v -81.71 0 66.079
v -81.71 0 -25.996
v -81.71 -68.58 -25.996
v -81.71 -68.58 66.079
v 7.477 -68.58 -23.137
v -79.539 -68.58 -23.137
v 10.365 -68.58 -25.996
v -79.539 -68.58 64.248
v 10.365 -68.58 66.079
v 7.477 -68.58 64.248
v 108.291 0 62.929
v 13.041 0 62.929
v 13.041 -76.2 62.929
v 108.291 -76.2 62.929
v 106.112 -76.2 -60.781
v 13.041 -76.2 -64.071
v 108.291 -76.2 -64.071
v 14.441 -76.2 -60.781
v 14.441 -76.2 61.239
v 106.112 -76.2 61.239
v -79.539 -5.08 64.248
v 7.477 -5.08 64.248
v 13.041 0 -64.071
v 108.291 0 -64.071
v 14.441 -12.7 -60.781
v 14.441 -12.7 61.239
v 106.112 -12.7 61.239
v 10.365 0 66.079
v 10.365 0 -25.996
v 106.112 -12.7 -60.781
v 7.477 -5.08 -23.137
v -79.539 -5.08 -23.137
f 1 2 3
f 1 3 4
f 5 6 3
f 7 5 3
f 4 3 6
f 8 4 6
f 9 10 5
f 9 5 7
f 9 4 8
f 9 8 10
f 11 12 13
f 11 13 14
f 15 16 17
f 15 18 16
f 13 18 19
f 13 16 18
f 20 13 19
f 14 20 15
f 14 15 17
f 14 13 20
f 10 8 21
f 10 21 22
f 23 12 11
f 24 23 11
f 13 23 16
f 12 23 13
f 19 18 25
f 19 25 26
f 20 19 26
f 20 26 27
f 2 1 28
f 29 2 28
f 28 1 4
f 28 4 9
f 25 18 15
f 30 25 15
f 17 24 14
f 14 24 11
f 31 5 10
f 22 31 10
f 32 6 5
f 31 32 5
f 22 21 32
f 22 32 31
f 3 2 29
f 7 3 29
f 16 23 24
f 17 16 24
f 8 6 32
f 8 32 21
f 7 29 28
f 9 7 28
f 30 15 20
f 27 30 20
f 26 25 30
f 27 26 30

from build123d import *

# Parameters (mm, degrees)
F0_W     = 92.075
F0_H     = 92.075
F1_DEPTH = 68.58
F2_W     = 87.015483
F2_H     = 87.384192
F3_DEPTH = 63.5
F4_W     = 95.25
F4_H     = 127
F5_DEPTH = 76.2
F6_W     = 91.671831
F6_H     = 122.019019
F7_DEPTH = 63.5


with BuildPart() as f1:
    # F0 (on Front) → F1 (new body)
    with BuildSketch(Plane.XZ):
        with Locations((-35.672663, 20.041113)):
            Rectangle(F0_W, F0_H)
    extrude(amount=F1_DEPTH)

    # F2 (on face) → F3 (cut)
    with BuildSketch(Plane.XZ.offset(68.58)):
        with Locations((-36.031126, 20.555564)):
            Rectangle(F2_W, F2_H)
    extrude(amount=-F3_DEPTH, mode=Mode.SUBTRACT)


with BuildPart() as f5:
    # F4 (on Front) → F5 (new body)
    with BuildSketch(Plane.XZ):
        with Locations((60.665718, -0.570852)):
            Rectangle(F4_W, F4_H)
    extrude(amount=F5_DEPTH)

    # F6 (on face) → F7 (cut)
    with BuildSketch(Plane.XZ.offset(76.2)):
        with Locations((60.276483, 0.229007)):
            Rectangle(F6_W, F6_H)
    extrude(amount=-F7_DEPTH, mode=Mode.SUBTRACT)


solid = Compound([f1.part, f5.part])
